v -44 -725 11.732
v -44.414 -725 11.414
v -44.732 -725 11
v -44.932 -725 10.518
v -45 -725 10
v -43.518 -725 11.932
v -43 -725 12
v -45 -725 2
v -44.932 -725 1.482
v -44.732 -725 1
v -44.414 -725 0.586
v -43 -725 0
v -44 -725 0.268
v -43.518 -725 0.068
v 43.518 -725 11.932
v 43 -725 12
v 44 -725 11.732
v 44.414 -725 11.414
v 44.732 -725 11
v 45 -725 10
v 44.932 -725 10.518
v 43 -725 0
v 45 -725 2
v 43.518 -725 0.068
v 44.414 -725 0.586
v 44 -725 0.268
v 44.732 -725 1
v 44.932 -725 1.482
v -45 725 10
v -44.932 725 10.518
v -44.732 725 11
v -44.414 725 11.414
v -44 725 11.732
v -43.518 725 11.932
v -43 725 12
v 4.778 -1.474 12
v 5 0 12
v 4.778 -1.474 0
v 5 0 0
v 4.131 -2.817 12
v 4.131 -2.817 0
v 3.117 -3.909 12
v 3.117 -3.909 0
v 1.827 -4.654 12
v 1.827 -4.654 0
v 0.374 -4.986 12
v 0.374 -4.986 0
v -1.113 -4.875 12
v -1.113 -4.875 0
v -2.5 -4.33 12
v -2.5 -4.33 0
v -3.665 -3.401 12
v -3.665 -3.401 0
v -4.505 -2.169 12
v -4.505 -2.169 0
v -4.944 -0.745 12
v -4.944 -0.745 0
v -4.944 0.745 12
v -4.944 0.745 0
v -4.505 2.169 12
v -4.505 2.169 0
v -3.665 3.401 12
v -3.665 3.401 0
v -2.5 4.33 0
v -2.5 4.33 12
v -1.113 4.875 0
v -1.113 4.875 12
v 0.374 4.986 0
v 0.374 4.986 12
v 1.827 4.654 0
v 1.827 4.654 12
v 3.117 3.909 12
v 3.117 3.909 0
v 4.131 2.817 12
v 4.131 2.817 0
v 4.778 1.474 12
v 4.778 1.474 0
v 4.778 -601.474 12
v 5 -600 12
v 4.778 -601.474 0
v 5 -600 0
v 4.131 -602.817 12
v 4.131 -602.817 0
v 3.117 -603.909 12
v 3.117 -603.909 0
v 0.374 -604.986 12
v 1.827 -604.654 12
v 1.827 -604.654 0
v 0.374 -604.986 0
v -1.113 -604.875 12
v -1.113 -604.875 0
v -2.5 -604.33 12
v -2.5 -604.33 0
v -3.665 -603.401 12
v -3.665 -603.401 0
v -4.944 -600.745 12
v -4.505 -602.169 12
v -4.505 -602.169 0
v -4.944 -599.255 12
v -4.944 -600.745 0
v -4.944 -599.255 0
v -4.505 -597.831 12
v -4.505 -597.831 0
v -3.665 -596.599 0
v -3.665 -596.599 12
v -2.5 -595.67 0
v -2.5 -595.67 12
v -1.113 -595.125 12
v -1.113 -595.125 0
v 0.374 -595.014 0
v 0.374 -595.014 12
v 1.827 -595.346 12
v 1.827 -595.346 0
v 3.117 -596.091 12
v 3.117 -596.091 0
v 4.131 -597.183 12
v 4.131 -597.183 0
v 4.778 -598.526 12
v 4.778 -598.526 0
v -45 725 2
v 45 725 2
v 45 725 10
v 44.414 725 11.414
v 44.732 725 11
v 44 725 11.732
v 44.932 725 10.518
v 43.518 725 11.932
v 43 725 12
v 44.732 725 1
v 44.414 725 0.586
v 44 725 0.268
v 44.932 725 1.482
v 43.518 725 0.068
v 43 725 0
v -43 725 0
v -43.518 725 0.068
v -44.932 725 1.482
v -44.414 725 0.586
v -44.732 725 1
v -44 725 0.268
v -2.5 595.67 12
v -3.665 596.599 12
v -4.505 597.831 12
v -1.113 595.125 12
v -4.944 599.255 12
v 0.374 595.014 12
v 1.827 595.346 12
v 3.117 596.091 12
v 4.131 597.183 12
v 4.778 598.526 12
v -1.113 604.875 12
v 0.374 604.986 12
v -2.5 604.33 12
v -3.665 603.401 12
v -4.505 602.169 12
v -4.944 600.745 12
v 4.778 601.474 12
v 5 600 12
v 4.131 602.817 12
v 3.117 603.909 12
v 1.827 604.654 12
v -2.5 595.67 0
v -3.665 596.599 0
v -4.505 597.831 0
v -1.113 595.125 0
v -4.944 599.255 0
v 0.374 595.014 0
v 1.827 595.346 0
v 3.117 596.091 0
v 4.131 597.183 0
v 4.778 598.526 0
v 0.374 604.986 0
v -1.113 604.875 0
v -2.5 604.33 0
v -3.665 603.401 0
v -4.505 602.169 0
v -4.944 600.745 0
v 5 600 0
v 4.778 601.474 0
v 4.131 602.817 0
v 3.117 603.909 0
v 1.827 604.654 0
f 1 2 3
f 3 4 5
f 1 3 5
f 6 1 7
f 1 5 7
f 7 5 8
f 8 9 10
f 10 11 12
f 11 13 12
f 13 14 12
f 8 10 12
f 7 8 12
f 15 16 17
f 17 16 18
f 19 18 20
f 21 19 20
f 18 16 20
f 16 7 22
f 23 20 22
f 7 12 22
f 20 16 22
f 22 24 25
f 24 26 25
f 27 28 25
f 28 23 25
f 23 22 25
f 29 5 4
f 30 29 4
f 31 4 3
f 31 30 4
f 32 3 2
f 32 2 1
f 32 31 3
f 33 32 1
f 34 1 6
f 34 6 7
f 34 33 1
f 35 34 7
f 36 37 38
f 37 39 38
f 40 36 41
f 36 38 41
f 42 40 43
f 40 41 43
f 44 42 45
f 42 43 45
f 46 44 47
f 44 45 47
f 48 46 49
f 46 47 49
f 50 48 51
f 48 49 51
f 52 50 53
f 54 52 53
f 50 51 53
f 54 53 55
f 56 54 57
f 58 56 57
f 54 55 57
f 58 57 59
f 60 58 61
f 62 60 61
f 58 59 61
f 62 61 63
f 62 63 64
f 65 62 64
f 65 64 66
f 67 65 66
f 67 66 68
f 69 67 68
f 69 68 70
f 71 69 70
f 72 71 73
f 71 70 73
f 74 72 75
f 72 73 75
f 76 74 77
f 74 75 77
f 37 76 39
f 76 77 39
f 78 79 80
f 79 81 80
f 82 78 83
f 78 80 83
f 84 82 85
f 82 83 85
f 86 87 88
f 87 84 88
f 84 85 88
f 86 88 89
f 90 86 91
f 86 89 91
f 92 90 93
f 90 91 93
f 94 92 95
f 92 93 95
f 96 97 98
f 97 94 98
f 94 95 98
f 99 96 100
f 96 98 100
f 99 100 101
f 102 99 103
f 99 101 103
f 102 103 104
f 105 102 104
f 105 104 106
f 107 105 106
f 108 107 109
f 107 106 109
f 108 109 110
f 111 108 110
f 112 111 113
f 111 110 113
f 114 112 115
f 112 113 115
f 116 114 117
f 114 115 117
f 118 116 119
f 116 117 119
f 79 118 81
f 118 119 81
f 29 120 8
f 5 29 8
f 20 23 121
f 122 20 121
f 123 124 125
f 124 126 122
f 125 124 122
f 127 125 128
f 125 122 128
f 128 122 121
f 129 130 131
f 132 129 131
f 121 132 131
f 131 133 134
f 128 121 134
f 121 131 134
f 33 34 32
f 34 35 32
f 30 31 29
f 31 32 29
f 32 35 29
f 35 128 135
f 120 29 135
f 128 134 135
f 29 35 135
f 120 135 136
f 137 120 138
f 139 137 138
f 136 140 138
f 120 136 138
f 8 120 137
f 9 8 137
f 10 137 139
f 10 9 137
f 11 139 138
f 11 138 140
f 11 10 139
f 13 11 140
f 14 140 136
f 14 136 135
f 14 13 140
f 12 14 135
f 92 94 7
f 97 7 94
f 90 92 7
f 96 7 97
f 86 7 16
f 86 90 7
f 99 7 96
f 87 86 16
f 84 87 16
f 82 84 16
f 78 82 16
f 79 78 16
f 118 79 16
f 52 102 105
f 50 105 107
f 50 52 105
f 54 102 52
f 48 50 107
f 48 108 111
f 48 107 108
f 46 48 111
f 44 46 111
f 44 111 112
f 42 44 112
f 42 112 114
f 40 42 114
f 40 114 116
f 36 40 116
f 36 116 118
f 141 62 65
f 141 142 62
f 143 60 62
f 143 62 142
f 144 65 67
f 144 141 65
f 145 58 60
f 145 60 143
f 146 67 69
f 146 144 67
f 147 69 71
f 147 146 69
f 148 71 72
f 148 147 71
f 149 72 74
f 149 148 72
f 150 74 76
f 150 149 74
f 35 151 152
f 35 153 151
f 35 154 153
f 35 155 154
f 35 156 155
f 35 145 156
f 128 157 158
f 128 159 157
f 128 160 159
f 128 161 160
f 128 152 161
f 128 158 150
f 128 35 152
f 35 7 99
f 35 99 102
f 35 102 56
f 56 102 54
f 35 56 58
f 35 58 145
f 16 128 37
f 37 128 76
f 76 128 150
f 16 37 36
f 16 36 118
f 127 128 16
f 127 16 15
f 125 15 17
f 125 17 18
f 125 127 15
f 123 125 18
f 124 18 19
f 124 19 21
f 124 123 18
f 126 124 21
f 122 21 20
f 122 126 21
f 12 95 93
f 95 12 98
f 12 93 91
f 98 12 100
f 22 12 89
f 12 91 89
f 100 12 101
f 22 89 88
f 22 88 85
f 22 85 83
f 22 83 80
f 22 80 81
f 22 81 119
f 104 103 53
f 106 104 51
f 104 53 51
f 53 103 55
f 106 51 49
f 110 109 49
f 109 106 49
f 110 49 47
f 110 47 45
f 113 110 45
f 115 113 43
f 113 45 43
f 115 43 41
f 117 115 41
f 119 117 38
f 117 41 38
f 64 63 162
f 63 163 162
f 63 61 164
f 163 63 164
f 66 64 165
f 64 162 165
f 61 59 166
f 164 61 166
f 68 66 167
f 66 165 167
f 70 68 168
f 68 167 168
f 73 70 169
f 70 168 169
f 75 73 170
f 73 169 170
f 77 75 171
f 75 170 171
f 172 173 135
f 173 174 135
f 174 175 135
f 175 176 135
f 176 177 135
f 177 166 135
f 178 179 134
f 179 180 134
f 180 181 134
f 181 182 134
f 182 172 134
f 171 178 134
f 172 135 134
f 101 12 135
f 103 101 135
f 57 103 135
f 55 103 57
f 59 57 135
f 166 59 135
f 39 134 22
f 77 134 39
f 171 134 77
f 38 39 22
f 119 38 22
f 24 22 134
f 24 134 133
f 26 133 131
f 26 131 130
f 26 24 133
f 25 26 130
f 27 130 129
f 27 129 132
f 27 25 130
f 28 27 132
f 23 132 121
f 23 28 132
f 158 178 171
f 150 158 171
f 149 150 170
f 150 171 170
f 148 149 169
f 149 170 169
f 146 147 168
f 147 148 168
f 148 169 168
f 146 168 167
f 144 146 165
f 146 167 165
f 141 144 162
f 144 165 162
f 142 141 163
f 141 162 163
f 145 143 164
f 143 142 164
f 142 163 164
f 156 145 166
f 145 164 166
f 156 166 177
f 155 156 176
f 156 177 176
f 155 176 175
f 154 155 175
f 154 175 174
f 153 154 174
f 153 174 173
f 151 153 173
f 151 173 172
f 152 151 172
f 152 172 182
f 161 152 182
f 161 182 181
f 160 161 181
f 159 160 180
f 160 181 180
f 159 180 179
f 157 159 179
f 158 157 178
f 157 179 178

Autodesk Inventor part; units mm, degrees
ref_plane "YZ Plane" through (0, 0, 0) normal (1, 0, 0) x (0, 1, 0)
ref_plane "XZ Plane" through (0, 0, 0) normal (0, 1, 0) x (-1, 0, 0)
ref_plane "Work Plane1" through (0, 0, 0) normal (0, 0, 1) x (1, 0, 0)
sketch "Sketch1" plane through (0, 0, 0) normal (0, 0, 1) x (1, 0, 0)
  line L0 (-45, -725) -> (45, -725)
  line L1 (45, -725) -> (45, 725)
  line L2 (45, 725) -> (-45, 725)
  line L3 (-45, 725) -> (-45, -725)
  line L4 (-385, 0) -> (385, 0) projected
  line L5 (0, -725) -> (0, 725) construction
  circle A0 centre (0, 0) radius 5
  circle A1 centre (0, -600) radius 5
  circle A2 centre (0, 600) radius 5
  circle A3 centre (240, -0.5) radius 5 construction
  circle A4 centre (120, -0.5) radius 5 construction
  circle A5 centre (-120, -0.5) radius 5 construction
  circle A6 centre (-240, -0.5) radius 5 construction
  circle A7 centre (0, -0.5) radius 5 construction
  line L6 (-275, -23) -> (275, -23) construction
  line L7 (275, 23) -> (275, -23) construction
  line L8 (275, 23) -> (-275, 23) construction
  line L9 (-275, -23) -> (-275, 23) construction
  point P0 (0, 0)
  point P1 (-45, 0)
  dimension "d0" = 90
  dimension "d1" = 1450
  dimension "d2" = 10
  dimension "d3" = 10
  dimension "d4" = 10
  dimension "d5" = 600
  dimension "d6" = 600
extrude "Extrusion1" add sketch "Sketch1" along normal blind 12 contours L3 L4 A0 L1 L0 | L3 L2 L1 L4 A0
fillet "Fillet1" radius 2 6 edges at (-45, -362.5, 12) (-45, 362.5, 12) (-45, -362.5, 0) (-45, 362.5, 0) (45, 0, 12) (45, 0, 0)
equation "\"d5\" = d6"
properties part number "doga_long1" material "Wood (Oak)"
